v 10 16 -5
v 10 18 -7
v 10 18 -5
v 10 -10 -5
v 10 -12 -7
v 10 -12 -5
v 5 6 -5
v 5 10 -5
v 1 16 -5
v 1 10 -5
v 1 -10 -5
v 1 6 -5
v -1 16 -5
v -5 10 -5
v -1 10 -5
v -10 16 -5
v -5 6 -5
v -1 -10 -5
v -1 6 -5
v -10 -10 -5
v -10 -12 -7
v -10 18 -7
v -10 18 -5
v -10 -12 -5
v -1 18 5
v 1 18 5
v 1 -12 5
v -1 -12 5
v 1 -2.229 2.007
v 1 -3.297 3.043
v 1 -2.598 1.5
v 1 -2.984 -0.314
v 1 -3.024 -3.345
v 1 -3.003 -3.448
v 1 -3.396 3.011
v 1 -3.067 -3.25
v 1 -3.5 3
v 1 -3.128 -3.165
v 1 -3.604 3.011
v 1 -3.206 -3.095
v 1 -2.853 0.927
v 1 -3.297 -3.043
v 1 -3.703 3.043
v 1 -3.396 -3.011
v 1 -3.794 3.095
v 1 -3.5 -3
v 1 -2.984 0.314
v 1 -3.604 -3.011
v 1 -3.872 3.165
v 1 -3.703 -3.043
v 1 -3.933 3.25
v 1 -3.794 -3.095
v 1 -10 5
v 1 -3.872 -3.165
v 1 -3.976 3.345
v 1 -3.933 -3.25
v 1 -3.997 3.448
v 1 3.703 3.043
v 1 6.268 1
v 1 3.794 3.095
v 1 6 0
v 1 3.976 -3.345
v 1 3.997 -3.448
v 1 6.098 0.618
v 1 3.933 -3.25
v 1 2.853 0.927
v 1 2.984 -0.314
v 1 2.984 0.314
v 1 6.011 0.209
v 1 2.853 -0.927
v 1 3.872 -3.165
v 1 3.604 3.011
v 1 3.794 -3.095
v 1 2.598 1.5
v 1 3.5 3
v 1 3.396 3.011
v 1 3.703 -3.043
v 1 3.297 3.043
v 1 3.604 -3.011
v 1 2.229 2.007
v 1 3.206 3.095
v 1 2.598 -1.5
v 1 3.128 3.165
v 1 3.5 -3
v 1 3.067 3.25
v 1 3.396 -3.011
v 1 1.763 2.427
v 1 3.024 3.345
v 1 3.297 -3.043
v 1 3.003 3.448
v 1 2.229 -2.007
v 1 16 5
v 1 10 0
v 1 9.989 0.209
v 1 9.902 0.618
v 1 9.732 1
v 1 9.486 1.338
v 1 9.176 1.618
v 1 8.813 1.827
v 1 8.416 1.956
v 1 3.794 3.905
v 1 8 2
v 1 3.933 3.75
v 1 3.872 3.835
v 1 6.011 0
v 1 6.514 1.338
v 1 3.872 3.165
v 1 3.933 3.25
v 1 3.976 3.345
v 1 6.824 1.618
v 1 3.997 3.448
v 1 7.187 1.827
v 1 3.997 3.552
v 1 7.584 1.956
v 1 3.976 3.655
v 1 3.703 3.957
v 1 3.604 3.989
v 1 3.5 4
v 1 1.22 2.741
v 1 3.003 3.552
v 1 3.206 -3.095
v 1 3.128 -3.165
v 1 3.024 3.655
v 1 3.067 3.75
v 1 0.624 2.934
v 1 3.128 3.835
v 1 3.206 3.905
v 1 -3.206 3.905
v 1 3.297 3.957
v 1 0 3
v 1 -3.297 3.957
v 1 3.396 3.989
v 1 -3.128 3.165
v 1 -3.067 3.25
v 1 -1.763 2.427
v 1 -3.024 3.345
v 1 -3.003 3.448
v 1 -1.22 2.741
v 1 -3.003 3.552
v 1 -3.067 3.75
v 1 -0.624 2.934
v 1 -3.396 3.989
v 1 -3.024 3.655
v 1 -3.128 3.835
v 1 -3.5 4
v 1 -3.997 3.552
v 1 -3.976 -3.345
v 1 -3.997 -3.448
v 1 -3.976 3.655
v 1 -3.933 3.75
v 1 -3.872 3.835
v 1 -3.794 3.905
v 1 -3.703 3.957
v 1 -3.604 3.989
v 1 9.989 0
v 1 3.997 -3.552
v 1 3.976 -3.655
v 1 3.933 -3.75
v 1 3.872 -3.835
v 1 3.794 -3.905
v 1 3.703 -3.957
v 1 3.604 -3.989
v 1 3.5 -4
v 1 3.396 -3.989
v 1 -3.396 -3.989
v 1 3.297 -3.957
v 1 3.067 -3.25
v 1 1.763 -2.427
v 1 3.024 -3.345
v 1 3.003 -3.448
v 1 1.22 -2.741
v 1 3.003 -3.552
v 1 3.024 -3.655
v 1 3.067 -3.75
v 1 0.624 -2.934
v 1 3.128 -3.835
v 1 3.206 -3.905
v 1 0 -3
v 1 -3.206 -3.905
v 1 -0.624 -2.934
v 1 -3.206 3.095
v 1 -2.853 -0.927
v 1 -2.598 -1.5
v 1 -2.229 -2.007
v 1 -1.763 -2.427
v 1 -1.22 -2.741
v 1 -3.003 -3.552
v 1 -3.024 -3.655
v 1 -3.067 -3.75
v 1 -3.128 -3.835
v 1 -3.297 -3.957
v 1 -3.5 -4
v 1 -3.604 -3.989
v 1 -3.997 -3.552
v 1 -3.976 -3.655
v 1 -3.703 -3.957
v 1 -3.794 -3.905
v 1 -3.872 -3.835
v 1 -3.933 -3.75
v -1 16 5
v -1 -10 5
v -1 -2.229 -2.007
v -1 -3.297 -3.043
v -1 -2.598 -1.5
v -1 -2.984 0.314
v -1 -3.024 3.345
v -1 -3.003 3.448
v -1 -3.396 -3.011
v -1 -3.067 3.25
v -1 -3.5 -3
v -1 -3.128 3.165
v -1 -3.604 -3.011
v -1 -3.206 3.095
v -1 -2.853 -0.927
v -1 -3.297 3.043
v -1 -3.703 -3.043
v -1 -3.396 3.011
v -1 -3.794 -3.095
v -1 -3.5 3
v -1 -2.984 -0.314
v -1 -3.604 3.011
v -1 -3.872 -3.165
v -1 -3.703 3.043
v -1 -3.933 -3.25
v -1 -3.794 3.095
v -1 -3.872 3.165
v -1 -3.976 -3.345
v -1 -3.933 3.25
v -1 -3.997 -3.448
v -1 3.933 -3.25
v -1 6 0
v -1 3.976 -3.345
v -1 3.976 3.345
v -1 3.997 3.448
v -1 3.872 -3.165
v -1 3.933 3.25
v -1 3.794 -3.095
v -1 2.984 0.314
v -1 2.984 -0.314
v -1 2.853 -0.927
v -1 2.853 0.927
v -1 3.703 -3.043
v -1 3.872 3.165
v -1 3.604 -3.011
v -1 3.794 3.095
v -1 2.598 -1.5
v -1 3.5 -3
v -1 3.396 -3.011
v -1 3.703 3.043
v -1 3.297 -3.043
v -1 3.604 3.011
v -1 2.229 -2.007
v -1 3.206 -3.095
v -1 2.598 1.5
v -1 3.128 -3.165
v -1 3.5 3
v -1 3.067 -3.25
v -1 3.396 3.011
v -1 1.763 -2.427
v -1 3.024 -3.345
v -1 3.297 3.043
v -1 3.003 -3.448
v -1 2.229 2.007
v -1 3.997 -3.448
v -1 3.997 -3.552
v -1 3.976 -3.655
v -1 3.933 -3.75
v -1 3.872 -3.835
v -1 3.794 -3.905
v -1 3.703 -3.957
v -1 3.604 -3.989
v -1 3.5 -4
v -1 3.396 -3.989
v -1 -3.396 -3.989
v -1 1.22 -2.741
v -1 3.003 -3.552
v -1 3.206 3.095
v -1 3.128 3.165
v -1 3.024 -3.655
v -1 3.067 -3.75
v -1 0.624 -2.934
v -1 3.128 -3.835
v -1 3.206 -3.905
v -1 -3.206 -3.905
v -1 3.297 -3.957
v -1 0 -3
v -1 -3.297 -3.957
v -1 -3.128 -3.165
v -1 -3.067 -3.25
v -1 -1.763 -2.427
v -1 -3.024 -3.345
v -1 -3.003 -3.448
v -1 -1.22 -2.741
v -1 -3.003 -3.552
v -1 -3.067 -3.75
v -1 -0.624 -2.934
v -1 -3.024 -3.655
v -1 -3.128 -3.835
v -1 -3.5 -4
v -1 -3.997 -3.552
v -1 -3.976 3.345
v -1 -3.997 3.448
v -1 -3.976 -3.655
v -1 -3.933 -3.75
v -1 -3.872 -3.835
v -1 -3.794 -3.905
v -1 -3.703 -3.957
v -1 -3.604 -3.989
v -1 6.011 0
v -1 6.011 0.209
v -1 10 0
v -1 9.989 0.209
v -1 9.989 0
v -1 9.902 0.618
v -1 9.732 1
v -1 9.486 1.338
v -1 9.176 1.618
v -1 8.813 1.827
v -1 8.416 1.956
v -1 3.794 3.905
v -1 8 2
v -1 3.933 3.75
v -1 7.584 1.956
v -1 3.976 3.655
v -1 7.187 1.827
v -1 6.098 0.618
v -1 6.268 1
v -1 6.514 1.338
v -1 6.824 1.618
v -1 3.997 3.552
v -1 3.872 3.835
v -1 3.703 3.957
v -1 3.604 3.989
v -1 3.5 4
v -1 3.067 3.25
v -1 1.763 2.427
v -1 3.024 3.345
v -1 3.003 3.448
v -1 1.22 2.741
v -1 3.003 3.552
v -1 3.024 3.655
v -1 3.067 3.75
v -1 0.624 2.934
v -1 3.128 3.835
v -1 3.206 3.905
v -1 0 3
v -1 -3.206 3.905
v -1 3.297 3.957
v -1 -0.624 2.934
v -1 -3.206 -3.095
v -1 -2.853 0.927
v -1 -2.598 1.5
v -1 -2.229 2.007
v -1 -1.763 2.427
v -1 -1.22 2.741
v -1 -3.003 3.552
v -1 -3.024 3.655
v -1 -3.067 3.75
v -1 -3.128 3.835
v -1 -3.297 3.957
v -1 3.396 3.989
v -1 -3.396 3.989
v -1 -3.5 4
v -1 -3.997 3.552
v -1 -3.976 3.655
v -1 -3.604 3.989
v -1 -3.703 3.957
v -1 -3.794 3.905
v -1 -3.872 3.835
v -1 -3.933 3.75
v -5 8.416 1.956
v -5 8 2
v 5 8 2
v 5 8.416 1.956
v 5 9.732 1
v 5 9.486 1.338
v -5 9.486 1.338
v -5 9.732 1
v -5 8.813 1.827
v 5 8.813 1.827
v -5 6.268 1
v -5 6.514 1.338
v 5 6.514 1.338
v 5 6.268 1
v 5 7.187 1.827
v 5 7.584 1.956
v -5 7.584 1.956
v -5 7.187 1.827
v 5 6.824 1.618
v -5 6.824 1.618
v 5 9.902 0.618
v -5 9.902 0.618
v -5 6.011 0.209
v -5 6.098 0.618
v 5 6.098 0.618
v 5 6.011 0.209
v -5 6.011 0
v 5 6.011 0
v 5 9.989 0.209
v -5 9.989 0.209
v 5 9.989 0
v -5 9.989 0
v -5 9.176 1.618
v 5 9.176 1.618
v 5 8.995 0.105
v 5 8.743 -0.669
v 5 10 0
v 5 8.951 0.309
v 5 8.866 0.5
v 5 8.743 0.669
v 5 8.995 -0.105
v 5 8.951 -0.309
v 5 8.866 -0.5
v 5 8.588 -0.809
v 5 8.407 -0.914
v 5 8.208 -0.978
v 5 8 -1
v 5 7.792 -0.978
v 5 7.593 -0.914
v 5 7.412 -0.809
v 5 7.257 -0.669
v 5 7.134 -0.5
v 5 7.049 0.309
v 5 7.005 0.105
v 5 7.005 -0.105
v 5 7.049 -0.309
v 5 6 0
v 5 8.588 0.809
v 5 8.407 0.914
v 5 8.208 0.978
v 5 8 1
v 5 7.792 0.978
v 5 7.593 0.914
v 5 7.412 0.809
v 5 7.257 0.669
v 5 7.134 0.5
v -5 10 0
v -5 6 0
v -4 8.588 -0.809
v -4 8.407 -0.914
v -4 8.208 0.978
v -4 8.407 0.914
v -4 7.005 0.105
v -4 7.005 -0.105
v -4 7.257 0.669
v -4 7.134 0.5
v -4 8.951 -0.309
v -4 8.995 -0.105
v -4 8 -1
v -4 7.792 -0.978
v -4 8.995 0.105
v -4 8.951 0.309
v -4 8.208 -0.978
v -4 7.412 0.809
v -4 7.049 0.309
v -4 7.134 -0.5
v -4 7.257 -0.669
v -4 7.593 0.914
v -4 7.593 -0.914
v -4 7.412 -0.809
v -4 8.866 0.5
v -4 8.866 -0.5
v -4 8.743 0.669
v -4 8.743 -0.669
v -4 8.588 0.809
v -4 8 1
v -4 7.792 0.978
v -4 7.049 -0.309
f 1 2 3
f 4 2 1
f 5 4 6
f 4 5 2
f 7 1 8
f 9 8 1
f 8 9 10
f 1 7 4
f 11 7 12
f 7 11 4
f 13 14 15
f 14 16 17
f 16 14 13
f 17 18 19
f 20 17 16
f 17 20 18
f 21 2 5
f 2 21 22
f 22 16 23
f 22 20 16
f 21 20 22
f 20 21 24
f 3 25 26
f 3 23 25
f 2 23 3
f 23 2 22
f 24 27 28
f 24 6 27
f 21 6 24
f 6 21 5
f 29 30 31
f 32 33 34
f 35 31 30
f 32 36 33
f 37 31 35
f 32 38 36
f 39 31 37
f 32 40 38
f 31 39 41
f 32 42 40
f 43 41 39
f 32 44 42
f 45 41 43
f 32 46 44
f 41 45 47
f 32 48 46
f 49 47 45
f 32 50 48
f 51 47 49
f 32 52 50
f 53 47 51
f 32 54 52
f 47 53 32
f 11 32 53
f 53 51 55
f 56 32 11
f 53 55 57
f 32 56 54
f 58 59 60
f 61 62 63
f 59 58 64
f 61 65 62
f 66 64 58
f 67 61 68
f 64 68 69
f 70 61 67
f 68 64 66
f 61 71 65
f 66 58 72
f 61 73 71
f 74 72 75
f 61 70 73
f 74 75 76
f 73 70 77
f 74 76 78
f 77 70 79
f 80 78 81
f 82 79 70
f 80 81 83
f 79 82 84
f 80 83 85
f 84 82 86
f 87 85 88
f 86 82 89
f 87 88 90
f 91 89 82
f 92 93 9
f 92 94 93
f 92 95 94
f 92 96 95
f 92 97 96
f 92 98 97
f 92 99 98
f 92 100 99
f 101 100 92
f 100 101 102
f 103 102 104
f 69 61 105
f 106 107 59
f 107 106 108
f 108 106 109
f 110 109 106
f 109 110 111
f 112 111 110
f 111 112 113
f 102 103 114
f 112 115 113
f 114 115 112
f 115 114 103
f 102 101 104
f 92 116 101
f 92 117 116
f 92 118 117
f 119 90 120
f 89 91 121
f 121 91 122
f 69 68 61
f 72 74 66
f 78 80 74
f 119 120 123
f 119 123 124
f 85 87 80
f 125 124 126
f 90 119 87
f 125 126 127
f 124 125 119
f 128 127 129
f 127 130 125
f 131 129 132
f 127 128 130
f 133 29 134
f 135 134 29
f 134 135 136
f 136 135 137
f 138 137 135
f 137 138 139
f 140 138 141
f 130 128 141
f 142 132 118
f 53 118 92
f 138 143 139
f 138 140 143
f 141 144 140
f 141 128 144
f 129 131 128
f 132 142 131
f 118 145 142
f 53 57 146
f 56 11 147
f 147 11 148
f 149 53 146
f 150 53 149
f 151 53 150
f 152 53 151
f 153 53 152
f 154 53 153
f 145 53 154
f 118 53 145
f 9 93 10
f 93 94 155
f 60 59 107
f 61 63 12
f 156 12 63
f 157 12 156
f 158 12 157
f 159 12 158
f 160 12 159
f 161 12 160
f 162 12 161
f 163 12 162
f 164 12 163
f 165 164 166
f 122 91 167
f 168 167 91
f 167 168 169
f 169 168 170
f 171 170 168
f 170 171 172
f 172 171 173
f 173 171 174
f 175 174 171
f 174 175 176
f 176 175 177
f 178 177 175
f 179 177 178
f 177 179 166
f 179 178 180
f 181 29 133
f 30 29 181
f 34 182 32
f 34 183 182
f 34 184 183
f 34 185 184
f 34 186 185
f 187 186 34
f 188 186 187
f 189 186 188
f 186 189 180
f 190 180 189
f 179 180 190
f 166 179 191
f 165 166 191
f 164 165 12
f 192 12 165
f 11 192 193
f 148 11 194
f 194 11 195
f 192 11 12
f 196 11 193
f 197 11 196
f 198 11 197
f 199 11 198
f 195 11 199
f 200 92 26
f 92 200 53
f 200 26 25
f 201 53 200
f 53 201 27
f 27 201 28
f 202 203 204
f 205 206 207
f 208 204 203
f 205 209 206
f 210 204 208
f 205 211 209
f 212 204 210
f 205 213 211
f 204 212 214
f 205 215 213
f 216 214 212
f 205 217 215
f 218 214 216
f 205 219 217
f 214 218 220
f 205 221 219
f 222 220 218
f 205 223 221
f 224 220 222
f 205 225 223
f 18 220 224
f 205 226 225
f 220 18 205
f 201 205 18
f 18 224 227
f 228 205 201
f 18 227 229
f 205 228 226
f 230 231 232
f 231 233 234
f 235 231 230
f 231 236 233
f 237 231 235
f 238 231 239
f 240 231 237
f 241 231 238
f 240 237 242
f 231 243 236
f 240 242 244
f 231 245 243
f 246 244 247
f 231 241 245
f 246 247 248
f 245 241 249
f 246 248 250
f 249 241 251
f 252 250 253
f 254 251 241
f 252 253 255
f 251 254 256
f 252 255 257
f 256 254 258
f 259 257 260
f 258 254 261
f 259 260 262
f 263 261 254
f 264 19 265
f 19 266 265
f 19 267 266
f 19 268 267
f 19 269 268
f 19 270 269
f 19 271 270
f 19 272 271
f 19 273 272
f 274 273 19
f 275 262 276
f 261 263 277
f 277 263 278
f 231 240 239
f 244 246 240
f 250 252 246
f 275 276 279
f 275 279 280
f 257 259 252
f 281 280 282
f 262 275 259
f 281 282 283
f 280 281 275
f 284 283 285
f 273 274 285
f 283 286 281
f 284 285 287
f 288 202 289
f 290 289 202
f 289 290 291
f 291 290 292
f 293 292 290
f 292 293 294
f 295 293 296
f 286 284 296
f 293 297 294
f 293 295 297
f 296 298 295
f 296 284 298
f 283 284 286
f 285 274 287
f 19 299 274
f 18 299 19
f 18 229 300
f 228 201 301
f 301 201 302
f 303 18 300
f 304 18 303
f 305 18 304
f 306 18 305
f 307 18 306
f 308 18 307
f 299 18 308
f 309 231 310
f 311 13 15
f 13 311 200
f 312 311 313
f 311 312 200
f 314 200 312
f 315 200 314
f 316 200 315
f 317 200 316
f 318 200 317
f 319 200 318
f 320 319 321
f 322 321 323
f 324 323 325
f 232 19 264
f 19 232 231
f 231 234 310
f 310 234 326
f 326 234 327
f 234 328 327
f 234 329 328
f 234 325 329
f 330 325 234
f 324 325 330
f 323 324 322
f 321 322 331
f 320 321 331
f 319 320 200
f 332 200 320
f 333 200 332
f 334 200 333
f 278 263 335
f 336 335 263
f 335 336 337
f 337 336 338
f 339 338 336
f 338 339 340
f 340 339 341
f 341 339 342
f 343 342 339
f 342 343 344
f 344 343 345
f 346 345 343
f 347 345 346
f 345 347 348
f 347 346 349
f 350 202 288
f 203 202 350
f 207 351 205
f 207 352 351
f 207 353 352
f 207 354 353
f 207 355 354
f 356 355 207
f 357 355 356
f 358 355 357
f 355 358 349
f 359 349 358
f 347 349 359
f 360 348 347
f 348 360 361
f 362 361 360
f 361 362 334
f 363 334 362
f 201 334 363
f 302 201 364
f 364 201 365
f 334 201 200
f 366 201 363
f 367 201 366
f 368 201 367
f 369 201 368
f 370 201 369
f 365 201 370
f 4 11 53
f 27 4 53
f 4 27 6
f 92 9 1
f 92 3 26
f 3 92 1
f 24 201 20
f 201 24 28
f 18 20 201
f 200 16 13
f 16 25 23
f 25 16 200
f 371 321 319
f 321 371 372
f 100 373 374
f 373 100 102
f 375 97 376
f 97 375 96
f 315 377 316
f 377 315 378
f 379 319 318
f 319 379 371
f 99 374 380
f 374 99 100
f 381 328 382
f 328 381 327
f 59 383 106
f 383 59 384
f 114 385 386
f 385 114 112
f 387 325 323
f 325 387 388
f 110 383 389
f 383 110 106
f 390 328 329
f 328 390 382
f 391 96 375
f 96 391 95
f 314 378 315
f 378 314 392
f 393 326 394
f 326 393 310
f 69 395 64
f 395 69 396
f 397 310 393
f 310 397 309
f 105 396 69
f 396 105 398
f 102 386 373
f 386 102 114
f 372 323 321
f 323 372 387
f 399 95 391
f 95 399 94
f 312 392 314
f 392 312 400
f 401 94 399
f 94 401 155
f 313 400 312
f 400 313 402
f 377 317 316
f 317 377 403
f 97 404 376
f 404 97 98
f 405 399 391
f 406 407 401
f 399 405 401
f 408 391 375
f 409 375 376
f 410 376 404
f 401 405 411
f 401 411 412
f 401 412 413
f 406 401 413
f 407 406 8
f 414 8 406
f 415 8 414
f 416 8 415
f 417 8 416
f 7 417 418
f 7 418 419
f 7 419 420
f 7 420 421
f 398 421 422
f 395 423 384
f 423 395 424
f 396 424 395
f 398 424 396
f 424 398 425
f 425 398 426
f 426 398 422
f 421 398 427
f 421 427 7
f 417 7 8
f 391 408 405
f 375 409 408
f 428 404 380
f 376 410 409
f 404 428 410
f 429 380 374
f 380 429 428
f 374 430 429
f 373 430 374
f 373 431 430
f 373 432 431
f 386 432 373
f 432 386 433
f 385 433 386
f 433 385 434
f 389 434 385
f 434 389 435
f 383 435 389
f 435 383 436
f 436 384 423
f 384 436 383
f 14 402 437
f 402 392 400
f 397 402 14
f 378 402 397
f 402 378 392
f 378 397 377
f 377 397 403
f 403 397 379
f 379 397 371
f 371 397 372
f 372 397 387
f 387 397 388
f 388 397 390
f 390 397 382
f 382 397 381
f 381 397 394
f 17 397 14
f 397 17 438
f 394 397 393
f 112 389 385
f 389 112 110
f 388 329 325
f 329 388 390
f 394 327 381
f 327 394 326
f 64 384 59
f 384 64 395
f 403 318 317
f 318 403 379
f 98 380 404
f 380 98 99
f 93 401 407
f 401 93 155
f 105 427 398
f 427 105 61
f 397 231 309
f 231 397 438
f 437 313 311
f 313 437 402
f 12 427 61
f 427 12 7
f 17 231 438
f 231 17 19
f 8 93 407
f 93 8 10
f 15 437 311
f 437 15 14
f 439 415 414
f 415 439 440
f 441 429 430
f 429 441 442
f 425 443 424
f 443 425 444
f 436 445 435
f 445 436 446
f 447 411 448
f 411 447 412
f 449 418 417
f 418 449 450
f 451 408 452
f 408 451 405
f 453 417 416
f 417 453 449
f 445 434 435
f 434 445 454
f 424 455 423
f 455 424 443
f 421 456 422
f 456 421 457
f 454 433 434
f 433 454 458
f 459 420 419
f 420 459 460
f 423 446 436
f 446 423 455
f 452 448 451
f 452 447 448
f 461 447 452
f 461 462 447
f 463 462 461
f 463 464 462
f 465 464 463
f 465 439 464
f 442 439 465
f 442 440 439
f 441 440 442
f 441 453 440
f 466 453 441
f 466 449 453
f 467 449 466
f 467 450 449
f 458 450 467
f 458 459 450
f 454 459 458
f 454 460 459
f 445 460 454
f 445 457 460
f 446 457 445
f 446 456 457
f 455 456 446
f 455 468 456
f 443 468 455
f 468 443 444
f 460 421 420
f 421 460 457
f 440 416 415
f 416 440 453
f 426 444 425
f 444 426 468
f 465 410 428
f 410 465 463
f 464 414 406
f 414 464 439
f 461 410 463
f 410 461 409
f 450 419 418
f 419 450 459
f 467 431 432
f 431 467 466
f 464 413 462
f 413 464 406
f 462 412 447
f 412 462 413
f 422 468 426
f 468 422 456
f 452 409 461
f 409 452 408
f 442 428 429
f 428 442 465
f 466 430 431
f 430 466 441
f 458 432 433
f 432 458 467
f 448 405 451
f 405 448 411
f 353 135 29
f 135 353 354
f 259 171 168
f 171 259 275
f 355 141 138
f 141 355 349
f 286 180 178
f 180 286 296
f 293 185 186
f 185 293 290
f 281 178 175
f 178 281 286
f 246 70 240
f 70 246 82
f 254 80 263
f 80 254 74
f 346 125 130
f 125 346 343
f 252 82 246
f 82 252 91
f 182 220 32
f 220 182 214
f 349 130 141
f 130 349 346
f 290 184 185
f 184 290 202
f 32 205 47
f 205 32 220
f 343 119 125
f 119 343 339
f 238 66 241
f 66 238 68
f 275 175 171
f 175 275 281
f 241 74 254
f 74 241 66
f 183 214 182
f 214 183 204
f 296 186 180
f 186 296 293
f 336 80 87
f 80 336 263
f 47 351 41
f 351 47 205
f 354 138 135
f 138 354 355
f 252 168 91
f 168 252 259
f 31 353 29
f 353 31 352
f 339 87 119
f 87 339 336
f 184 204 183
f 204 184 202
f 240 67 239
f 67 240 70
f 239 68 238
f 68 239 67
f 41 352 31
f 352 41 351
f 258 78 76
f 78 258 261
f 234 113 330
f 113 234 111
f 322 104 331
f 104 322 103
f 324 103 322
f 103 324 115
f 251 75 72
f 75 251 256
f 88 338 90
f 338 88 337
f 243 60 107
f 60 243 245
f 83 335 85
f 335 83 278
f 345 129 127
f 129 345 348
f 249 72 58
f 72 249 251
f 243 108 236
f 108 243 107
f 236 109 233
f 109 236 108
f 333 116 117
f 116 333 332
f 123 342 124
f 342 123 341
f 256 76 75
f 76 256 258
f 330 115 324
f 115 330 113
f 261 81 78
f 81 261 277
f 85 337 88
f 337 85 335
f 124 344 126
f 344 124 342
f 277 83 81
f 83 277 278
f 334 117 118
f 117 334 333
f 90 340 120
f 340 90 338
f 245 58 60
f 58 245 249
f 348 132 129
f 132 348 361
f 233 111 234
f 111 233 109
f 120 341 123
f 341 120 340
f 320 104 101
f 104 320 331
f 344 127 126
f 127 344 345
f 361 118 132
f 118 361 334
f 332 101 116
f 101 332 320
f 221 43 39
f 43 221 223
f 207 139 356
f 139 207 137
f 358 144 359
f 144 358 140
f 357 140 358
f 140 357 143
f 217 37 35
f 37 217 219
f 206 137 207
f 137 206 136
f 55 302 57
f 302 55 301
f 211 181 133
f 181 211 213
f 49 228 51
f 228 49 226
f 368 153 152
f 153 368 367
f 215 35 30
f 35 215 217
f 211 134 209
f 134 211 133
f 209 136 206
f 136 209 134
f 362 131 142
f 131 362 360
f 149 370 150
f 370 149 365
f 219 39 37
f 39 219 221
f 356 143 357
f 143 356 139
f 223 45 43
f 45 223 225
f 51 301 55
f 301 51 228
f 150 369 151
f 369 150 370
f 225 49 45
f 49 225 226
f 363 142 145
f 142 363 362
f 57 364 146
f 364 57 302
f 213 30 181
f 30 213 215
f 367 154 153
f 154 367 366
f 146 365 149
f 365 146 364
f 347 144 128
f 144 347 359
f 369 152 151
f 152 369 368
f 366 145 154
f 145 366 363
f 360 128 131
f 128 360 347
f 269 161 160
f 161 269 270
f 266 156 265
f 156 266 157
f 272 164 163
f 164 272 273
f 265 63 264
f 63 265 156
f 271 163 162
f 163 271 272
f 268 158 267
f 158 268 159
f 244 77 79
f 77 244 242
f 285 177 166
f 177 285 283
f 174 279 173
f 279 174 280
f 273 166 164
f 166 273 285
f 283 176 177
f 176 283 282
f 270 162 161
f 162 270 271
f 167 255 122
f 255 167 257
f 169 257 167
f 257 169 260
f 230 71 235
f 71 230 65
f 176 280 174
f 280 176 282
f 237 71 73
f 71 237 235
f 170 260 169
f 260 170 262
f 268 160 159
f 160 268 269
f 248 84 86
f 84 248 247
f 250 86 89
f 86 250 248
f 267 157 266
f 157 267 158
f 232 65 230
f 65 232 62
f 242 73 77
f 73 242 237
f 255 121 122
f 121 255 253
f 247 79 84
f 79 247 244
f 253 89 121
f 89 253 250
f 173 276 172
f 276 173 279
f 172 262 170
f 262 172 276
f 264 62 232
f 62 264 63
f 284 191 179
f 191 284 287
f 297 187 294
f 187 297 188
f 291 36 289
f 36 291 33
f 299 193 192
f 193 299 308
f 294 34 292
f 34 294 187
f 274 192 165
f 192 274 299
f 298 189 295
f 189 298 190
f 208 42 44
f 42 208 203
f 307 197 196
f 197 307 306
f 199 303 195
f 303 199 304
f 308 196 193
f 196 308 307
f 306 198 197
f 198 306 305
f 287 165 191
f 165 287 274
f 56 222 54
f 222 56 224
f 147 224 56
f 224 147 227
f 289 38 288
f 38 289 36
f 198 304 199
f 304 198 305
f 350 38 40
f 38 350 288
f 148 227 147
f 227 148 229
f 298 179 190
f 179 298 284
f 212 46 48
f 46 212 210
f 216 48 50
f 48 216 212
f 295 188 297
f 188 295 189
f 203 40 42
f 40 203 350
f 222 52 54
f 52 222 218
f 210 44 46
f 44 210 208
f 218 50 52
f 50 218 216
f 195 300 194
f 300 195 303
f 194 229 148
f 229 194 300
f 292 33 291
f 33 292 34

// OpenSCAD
// file: prism.scad
/*
 * Creates a prism
 */
module prism(v,h){
  linear_extrude(height=h,slices=1)
  polygon(v);
}

prism([[0,0],[10,0],[0,20]],10);
// main file
/*
 * face[3] = [length,width,thickness] of the face
 * back[2] = [length,thickness] of the back (width taken from face)
 * plate_offset[2] = [x_offset,y_offset] of the face hole, from the face center
 * plate_hole = diameter of face hole
 * motor_bolt_offset[2] = [x_offset,y_offset] of motor bolt hole from plate hole
 * motor_bolt_hole = diameter of motor bolt hole
 * rod_offset[2] =[x_offset,y_offset] of the rod, from the plate center
 * rod[4] = [outer_h,outer_d,inner_d,inner_pad, offset] of rod supp-ort
 */

use <prism.scad>;

module z_stepper_housing(face,back,plate_offset,plate_hole,motor_bolt_offset,motor_bolt_hole,rod_offset,rod,supp){
  difference(){
    union(){
      // block
      // move the block so the origin is at the motor hole
        plate_offset_z=face[1]/2+plate_offset[1];
      translate([0,plate_offset[0],-plate_offset_z])
        union(){
          // back
          translate([-back[0]/2,-face[0]/2,-back[1]])
          cube([back[0],face[0],back[1]]);
          // face
          translate([-face[2]/2,-face[0]/2,0])
          cube([face[2],face[0],face[1]]);
          // top-right-support
          translate([0,(supp-face[0])/2,0]) //shift
          rotate(a=90,v=[1,0,0]) //rotate
          translate([0,0,-supp/2]) //center
          prism([[face[2]/2,0],[back[0]/2,0],[face[2]/2,back[0]/2]],supp);
          // top-left-support
          translate([0,-(supp-face[0])/2,0]) //shift
          rotate(a=90,v=[1,0,0]) //rotate
          translate([0,0,-supp/2]) //center
          prism([[face[2]/2,0],[back[0]/2,0],[face[2]/2,back[0]/2]],supp);
          // bot-right-support
          translate([0,(supp-face[0])/2,0]) //shift
          rotate(a=180,v=[0,1,0])
          rotate(a=-90,v=[1,0,0]) //rotate
          translate([0,0,-supp/2]) //center
          prism([[face[2]/2,0],[back[0]/2,0],[face[2]/2,back[0]/2]],supp);
          // bot-left-support
          translate([0,-(supp-face[0])/2,0]) //shift
          rotate(a=180,v=[0,1,0])
          rotate(a=-90,v=[1,0,0]) //rotate
          translate([0,0,-supp/2]) //center
          prism([[face[2]/2,0],[back[0]/2,0],[face[2]/2,back[0]/2]],supp);
        }
      // linear rod mount
      translate([-rod[0]/2,rod_offset[0],-rod_offset[1]])
      rotate(a=90,v=[0,1,0])
      cylinder(h=rod[0],r=rod[1],$fn=30);
      // linear rod support
      translate([-rod[0]/2,rod[1]+rod_offset[0]/2,-rod_offset[1]])
      rotate(a=90,v=[0,1,0])
      cube([plate_offset_z,rod[1]*2,rod[0]]);
    }
    // remove the linear rod hole
    translate([rod[3]-rod[0]/2,rod_offset[0],-rod_offset[1]])
    rotate(a=90,v=[0,1,0])
    cylinder(h=rod[0]-rod[3]+1,r=rod[2],$fn=30);

    // the plate_hole
    translate([-face[2]/2-1,0,0])
    rotate(a=90,v=[0,1,0])
    cylinder(h=face[2]+2,r=plate_hole,$fn=30);

    // create all 4 motor motor_bolt holes
    _motor_bolt_hole(face[2],motor_bolt_hole, motor_bolt_offset);
    _motor_bolt_hole(face[2],motor_bolt_hole, [-1*motor_bolt_offset[0], motor_bolt_offset[1]]);
    _motor_bolt_hole(face[2],motor_bolt_hole, [motor_bolt_offset[0], -1*motor_bolt_offset[1]]);
    _motor_bolt_hole(face[2],motor_bolt_hole, [-1*motor_bolt_offset[0], -1*motor_bolt_offset[1]]);
  }
}

module _motor_bolt_hole(depth, radius, offset){
  translate([-depth/2-1,offset[0],offset[1]])
  rotate(a=90,v=[0,1,0])
  cylinder(h=depth+2,r=radius,$fn=30);
}

z_stepper_housing([30,10,2],[20,2],[3,0],3,[3.5,3.5],0.5,[8,0],[10,2,1,1],2);
